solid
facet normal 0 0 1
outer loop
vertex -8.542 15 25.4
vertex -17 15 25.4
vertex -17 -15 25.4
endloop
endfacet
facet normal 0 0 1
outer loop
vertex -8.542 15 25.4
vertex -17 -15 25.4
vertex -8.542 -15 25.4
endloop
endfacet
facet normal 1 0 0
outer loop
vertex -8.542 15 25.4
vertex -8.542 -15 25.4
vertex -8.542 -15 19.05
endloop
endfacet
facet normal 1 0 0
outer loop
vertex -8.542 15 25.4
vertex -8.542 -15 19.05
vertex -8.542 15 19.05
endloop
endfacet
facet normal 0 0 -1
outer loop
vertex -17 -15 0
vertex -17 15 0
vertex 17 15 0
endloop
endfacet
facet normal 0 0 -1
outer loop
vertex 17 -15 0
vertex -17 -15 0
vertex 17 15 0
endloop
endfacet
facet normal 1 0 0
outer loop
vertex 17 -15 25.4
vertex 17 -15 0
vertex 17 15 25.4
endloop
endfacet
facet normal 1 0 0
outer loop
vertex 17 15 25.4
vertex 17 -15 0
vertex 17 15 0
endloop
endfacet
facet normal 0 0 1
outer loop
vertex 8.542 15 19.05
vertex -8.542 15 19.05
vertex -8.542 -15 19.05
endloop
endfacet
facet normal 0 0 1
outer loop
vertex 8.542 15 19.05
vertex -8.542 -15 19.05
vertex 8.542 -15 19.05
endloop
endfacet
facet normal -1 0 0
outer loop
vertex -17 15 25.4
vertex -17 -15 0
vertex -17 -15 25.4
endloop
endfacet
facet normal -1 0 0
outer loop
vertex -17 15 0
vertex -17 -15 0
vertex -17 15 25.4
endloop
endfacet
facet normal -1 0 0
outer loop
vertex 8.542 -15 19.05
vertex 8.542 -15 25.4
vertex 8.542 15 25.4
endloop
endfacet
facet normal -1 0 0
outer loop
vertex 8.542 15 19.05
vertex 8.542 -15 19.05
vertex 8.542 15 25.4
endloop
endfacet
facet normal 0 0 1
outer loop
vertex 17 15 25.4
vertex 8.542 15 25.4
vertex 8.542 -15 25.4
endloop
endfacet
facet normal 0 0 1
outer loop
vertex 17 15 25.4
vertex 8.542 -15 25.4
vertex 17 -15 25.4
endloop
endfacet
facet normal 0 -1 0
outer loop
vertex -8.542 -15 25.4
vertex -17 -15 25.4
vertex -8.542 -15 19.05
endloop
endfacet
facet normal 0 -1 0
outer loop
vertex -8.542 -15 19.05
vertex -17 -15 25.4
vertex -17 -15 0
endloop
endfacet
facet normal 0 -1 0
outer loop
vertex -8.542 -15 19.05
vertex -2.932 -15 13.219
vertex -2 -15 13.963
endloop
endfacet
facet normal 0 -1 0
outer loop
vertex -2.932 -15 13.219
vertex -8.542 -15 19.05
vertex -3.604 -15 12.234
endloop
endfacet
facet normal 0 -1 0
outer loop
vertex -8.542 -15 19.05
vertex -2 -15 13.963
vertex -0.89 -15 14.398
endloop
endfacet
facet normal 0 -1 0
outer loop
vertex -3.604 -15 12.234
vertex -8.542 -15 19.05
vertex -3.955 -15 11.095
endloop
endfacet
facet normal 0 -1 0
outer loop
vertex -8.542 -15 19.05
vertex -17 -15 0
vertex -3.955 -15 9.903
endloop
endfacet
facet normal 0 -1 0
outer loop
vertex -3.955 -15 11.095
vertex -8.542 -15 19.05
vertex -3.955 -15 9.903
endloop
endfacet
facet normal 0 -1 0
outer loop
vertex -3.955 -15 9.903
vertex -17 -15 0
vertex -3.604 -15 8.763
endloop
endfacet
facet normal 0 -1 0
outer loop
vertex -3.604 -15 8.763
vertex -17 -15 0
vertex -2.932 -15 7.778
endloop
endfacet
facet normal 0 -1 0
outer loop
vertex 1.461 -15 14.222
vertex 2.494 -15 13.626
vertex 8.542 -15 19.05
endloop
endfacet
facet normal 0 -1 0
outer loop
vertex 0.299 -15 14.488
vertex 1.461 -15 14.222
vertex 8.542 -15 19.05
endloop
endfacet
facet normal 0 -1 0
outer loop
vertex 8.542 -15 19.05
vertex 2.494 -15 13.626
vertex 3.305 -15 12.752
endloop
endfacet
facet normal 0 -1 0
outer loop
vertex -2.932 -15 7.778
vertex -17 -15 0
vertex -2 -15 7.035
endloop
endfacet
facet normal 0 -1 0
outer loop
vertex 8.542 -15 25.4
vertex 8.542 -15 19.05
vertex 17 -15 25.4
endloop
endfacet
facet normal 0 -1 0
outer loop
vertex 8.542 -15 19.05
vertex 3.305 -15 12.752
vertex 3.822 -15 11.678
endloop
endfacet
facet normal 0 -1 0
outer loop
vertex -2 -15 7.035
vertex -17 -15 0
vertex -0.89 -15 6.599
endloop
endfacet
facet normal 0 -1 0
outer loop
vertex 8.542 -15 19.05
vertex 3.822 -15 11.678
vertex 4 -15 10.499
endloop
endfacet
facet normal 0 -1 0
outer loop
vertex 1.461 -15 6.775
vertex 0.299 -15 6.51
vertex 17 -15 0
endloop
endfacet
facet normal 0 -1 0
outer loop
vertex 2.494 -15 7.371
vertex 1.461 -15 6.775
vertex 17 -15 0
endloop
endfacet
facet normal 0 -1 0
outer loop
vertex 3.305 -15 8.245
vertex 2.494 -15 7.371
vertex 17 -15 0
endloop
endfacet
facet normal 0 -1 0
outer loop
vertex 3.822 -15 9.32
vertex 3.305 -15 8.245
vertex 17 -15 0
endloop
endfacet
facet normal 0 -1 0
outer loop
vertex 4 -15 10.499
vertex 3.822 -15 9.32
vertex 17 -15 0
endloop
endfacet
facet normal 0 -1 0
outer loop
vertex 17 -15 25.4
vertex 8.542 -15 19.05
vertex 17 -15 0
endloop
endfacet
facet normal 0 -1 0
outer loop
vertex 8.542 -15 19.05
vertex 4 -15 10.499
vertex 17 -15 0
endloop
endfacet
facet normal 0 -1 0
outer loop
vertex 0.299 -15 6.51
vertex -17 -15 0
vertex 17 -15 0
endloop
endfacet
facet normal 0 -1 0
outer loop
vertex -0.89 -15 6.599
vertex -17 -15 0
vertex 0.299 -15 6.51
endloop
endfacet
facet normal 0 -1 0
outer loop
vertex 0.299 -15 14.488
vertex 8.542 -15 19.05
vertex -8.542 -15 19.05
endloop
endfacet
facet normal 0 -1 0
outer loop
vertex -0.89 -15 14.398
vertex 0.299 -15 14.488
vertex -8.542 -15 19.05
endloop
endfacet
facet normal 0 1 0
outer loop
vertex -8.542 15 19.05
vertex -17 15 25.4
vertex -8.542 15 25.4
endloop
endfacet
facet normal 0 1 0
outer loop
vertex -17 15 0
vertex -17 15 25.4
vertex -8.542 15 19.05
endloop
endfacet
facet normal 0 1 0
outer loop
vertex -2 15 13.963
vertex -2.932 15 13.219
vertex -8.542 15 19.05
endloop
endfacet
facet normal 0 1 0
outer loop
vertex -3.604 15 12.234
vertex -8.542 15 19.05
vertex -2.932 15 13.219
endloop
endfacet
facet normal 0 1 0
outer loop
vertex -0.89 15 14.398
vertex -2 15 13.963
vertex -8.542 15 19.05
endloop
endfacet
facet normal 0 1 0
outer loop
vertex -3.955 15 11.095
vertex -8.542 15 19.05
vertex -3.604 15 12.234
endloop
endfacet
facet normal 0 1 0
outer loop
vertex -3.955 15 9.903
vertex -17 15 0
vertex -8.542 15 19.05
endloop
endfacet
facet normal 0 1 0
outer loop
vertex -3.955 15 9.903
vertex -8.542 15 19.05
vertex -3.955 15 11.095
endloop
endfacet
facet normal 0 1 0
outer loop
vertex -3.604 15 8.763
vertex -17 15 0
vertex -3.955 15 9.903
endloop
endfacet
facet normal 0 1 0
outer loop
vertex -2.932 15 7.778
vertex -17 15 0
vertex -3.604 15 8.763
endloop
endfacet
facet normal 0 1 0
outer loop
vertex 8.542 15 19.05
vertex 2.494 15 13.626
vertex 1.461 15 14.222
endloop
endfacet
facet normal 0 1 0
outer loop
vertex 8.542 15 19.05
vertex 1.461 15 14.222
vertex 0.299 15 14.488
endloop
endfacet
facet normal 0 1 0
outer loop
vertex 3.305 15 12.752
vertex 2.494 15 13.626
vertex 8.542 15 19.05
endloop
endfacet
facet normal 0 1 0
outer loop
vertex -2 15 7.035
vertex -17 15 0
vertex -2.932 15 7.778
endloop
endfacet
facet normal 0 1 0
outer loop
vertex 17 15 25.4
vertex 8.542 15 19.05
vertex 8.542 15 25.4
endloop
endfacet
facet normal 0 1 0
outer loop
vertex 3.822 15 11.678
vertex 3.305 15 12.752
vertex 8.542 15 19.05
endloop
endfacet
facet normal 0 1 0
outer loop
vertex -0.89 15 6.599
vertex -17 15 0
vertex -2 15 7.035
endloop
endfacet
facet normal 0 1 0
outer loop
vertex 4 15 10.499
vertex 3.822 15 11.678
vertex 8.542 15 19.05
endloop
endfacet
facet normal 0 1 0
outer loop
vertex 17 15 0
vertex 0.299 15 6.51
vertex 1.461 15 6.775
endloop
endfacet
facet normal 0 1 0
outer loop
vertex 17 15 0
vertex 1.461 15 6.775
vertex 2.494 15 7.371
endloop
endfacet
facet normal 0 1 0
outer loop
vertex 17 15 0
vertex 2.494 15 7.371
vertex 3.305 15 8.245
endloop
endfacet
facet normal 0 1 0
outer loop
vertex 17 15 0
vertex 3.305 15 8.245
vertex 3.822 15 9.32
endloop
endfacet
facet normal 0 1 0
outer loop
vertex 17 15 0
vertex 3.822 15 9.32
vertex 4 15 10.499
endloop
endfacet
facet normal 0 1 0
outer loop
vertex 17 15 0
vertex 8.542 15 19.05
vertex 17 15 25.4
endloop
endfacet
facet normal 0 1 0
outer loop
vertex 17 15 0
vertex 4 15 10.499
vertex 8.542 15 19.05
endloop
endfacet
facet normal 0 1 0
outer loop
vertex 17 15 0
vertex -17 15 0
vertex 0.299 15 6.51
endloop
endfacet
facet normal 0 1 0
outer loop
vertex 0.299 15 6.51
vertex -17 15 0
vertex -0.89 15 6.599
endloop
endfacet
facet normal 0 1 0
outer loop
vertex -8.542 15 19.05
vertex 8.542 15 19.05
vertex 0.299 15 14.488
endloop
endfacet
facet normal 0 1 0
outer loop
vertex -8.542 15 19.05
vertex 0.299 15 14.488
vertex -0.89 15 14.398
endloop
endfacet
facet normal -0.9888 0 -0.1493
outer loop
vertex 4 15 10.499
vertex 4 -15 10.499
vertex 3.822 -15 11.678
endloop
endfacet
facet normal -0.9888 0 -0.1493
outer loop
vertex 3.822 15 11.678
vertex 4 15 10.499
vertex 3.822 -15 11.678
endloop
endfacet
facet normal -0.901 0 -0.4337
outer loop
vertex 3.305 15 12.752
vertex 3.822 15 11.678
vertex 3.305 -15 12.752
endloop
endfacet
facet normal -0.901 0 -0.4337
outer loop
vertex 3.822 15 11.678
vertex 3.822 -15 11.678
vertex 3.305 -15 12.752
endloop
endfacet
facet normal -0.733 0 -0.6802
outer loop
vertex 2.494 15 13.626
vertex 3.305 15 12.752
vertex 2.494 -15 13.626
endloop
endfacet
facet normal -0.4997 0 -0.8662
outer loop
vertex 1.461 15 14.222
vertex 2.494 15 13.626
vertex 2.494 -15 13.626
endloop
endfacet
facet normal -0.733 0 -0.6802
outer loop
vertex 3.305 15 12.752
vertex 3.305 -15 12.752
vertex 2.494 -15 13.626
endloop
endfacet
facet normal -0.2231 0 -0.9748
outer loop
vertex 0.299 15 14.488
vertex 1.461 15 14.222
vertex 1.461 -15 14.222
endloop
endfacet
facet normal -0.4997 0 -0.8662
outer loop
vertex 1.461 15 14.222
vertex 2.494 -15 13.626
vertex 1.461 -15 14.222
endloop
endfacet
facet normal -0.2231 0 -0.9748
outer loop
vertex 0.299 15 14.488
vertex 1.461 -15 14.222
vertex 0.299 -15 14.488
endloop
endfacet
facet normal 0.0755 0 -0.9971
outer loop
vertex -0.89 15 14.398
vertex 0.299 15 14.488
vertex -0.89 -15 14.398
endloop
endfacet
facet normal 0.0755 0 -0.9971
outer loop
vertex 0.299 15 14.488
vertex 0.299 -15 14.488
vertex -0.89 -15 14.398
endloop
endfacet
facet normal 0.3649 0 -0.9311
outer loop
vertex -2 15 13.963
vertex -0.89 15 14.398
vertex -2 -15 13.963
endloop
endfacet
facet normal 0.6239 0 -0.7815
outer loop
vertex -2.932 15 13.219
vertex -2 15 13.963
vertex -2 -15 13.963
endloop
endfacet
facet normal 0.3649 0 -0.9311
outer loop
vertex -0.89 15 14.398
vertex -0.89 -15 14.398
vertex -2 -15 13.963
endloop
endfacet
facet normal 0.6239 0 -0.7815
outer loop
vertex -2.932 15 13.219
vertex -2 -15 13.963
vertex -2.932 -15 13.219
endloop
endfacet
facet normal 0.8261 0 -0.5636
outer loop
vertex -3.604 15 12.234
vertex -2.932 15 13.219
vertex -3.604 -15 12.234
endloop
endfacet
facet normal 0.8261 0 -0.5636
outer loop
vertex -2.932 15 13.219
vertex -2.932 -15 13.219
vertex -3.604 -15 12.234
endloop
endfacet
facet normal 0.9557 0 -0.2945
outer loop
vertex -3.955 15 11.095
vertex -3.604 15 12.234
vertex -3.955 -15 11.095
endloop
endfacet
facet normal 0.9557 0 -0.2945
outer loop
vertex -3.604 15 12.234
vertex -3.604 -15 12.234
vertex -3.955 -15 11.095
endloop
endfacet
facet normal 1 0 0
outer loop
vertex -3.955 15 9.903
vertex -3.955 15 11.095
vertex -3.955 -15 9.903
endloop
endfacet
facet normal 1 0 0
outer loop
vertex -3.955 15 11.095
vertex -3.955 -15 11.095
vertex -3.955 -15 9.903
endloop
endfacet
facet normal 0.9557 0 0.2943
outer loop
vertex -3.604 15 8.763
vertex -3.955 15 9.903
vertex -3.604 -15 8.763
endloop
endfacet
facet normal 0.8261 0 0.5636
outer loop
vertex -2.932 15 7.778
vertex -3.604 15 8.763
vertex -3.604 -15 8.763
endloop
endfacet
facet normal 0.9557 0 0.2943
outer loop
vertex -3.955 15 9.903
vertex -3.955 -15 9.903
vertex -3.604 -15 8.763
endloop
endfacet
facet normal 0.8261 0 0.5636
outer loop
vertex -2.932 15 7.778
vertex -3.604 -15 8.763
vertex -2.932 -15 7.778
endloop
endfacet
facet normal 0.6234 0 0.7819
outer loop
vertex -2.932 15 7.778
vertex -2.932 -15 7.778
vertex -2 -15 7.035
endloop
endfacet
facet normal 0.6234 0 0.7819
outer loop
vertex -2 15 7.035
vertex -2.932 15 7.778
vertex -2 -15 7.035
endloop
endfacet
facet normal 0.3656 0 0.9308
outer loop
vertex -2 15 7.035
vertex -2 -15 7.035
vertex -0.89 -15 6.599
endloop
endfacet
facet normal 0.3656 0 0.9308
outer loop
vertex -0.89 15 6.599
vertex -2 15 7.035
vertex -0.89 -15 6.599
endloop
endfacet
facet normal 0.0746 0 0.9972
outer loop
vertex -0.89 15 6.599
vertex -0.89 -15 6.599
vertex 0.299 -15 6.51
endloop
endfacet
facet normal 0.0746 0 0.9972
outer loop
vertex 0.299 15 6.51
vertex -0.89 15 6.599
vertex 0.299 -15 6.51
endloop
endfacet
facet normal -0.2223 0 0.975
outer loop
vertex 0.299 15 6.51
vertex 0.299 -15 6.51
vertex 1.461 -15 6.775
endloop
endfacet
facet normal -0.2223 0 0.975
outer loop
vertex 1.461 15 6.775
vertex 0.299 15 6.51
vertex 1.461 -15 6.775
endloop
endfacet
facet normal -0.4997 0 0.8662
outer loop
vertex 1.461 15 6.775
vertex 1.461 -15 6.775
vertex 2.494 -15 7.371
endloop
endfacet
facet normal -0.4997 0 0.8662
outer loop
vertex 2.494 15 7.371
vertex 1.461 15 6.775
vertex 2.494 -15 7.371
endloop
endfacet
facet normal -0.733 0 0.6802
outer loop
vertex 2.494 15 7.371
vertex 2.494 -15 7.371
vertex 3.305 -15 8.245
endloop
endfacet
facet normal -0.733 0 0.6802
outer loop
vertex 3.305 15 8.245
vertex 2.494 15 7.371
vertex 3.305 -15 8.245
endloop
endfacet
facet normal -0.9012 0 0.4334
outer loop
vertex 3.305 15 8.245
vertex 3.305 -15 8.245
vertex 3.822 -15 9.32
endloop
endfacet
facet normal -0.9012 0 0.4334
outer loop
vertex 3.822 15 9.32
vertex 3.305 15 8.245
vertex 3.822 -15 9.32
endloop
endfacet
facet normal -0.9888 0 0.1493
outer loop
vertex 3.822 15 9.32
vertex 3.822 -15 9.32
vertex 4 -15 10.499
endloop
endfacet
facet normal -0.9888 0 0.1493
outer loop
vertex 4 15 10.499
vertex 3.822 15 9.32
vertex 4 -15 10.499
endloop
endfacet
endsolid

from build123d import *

# Parameters (mm, degrees)
F0_W     = 34
F0_H     = 30
F1_DEPTH = 25.4
F2_R     = 4
F3_DEPTH = 30.001
F4_W     = 17.084244
F4_H     = 30
F5_DEPTH = 6.35


with BuildPart() as f1:
    # F0 (on Top) → F1 (new body)
    with BuildSketch(Plane.XY):
        Rectangle(F0_W, F0_H)
    extrude(amount=F1_DEPTH)

    # F2 (on face) → F3 (cut, through all)
    with BuildSketch(Plane.XZ.offset(15)):
        with Locations((0, 10.498762)):
            Circle(F2_R)
    extrude(amount=-F3_DEPTH, mode=Mode.SUBTRACT)

    # F4 (on face) → F5 (cut)
    with BuildSketch(Plane.XY.offset(25.4)):
        Rectangle(F4_W, F4_H)
    extrude(amount=-F5_DEPTH, mode=Mode.SUBTRACT)


solid = f1.part
